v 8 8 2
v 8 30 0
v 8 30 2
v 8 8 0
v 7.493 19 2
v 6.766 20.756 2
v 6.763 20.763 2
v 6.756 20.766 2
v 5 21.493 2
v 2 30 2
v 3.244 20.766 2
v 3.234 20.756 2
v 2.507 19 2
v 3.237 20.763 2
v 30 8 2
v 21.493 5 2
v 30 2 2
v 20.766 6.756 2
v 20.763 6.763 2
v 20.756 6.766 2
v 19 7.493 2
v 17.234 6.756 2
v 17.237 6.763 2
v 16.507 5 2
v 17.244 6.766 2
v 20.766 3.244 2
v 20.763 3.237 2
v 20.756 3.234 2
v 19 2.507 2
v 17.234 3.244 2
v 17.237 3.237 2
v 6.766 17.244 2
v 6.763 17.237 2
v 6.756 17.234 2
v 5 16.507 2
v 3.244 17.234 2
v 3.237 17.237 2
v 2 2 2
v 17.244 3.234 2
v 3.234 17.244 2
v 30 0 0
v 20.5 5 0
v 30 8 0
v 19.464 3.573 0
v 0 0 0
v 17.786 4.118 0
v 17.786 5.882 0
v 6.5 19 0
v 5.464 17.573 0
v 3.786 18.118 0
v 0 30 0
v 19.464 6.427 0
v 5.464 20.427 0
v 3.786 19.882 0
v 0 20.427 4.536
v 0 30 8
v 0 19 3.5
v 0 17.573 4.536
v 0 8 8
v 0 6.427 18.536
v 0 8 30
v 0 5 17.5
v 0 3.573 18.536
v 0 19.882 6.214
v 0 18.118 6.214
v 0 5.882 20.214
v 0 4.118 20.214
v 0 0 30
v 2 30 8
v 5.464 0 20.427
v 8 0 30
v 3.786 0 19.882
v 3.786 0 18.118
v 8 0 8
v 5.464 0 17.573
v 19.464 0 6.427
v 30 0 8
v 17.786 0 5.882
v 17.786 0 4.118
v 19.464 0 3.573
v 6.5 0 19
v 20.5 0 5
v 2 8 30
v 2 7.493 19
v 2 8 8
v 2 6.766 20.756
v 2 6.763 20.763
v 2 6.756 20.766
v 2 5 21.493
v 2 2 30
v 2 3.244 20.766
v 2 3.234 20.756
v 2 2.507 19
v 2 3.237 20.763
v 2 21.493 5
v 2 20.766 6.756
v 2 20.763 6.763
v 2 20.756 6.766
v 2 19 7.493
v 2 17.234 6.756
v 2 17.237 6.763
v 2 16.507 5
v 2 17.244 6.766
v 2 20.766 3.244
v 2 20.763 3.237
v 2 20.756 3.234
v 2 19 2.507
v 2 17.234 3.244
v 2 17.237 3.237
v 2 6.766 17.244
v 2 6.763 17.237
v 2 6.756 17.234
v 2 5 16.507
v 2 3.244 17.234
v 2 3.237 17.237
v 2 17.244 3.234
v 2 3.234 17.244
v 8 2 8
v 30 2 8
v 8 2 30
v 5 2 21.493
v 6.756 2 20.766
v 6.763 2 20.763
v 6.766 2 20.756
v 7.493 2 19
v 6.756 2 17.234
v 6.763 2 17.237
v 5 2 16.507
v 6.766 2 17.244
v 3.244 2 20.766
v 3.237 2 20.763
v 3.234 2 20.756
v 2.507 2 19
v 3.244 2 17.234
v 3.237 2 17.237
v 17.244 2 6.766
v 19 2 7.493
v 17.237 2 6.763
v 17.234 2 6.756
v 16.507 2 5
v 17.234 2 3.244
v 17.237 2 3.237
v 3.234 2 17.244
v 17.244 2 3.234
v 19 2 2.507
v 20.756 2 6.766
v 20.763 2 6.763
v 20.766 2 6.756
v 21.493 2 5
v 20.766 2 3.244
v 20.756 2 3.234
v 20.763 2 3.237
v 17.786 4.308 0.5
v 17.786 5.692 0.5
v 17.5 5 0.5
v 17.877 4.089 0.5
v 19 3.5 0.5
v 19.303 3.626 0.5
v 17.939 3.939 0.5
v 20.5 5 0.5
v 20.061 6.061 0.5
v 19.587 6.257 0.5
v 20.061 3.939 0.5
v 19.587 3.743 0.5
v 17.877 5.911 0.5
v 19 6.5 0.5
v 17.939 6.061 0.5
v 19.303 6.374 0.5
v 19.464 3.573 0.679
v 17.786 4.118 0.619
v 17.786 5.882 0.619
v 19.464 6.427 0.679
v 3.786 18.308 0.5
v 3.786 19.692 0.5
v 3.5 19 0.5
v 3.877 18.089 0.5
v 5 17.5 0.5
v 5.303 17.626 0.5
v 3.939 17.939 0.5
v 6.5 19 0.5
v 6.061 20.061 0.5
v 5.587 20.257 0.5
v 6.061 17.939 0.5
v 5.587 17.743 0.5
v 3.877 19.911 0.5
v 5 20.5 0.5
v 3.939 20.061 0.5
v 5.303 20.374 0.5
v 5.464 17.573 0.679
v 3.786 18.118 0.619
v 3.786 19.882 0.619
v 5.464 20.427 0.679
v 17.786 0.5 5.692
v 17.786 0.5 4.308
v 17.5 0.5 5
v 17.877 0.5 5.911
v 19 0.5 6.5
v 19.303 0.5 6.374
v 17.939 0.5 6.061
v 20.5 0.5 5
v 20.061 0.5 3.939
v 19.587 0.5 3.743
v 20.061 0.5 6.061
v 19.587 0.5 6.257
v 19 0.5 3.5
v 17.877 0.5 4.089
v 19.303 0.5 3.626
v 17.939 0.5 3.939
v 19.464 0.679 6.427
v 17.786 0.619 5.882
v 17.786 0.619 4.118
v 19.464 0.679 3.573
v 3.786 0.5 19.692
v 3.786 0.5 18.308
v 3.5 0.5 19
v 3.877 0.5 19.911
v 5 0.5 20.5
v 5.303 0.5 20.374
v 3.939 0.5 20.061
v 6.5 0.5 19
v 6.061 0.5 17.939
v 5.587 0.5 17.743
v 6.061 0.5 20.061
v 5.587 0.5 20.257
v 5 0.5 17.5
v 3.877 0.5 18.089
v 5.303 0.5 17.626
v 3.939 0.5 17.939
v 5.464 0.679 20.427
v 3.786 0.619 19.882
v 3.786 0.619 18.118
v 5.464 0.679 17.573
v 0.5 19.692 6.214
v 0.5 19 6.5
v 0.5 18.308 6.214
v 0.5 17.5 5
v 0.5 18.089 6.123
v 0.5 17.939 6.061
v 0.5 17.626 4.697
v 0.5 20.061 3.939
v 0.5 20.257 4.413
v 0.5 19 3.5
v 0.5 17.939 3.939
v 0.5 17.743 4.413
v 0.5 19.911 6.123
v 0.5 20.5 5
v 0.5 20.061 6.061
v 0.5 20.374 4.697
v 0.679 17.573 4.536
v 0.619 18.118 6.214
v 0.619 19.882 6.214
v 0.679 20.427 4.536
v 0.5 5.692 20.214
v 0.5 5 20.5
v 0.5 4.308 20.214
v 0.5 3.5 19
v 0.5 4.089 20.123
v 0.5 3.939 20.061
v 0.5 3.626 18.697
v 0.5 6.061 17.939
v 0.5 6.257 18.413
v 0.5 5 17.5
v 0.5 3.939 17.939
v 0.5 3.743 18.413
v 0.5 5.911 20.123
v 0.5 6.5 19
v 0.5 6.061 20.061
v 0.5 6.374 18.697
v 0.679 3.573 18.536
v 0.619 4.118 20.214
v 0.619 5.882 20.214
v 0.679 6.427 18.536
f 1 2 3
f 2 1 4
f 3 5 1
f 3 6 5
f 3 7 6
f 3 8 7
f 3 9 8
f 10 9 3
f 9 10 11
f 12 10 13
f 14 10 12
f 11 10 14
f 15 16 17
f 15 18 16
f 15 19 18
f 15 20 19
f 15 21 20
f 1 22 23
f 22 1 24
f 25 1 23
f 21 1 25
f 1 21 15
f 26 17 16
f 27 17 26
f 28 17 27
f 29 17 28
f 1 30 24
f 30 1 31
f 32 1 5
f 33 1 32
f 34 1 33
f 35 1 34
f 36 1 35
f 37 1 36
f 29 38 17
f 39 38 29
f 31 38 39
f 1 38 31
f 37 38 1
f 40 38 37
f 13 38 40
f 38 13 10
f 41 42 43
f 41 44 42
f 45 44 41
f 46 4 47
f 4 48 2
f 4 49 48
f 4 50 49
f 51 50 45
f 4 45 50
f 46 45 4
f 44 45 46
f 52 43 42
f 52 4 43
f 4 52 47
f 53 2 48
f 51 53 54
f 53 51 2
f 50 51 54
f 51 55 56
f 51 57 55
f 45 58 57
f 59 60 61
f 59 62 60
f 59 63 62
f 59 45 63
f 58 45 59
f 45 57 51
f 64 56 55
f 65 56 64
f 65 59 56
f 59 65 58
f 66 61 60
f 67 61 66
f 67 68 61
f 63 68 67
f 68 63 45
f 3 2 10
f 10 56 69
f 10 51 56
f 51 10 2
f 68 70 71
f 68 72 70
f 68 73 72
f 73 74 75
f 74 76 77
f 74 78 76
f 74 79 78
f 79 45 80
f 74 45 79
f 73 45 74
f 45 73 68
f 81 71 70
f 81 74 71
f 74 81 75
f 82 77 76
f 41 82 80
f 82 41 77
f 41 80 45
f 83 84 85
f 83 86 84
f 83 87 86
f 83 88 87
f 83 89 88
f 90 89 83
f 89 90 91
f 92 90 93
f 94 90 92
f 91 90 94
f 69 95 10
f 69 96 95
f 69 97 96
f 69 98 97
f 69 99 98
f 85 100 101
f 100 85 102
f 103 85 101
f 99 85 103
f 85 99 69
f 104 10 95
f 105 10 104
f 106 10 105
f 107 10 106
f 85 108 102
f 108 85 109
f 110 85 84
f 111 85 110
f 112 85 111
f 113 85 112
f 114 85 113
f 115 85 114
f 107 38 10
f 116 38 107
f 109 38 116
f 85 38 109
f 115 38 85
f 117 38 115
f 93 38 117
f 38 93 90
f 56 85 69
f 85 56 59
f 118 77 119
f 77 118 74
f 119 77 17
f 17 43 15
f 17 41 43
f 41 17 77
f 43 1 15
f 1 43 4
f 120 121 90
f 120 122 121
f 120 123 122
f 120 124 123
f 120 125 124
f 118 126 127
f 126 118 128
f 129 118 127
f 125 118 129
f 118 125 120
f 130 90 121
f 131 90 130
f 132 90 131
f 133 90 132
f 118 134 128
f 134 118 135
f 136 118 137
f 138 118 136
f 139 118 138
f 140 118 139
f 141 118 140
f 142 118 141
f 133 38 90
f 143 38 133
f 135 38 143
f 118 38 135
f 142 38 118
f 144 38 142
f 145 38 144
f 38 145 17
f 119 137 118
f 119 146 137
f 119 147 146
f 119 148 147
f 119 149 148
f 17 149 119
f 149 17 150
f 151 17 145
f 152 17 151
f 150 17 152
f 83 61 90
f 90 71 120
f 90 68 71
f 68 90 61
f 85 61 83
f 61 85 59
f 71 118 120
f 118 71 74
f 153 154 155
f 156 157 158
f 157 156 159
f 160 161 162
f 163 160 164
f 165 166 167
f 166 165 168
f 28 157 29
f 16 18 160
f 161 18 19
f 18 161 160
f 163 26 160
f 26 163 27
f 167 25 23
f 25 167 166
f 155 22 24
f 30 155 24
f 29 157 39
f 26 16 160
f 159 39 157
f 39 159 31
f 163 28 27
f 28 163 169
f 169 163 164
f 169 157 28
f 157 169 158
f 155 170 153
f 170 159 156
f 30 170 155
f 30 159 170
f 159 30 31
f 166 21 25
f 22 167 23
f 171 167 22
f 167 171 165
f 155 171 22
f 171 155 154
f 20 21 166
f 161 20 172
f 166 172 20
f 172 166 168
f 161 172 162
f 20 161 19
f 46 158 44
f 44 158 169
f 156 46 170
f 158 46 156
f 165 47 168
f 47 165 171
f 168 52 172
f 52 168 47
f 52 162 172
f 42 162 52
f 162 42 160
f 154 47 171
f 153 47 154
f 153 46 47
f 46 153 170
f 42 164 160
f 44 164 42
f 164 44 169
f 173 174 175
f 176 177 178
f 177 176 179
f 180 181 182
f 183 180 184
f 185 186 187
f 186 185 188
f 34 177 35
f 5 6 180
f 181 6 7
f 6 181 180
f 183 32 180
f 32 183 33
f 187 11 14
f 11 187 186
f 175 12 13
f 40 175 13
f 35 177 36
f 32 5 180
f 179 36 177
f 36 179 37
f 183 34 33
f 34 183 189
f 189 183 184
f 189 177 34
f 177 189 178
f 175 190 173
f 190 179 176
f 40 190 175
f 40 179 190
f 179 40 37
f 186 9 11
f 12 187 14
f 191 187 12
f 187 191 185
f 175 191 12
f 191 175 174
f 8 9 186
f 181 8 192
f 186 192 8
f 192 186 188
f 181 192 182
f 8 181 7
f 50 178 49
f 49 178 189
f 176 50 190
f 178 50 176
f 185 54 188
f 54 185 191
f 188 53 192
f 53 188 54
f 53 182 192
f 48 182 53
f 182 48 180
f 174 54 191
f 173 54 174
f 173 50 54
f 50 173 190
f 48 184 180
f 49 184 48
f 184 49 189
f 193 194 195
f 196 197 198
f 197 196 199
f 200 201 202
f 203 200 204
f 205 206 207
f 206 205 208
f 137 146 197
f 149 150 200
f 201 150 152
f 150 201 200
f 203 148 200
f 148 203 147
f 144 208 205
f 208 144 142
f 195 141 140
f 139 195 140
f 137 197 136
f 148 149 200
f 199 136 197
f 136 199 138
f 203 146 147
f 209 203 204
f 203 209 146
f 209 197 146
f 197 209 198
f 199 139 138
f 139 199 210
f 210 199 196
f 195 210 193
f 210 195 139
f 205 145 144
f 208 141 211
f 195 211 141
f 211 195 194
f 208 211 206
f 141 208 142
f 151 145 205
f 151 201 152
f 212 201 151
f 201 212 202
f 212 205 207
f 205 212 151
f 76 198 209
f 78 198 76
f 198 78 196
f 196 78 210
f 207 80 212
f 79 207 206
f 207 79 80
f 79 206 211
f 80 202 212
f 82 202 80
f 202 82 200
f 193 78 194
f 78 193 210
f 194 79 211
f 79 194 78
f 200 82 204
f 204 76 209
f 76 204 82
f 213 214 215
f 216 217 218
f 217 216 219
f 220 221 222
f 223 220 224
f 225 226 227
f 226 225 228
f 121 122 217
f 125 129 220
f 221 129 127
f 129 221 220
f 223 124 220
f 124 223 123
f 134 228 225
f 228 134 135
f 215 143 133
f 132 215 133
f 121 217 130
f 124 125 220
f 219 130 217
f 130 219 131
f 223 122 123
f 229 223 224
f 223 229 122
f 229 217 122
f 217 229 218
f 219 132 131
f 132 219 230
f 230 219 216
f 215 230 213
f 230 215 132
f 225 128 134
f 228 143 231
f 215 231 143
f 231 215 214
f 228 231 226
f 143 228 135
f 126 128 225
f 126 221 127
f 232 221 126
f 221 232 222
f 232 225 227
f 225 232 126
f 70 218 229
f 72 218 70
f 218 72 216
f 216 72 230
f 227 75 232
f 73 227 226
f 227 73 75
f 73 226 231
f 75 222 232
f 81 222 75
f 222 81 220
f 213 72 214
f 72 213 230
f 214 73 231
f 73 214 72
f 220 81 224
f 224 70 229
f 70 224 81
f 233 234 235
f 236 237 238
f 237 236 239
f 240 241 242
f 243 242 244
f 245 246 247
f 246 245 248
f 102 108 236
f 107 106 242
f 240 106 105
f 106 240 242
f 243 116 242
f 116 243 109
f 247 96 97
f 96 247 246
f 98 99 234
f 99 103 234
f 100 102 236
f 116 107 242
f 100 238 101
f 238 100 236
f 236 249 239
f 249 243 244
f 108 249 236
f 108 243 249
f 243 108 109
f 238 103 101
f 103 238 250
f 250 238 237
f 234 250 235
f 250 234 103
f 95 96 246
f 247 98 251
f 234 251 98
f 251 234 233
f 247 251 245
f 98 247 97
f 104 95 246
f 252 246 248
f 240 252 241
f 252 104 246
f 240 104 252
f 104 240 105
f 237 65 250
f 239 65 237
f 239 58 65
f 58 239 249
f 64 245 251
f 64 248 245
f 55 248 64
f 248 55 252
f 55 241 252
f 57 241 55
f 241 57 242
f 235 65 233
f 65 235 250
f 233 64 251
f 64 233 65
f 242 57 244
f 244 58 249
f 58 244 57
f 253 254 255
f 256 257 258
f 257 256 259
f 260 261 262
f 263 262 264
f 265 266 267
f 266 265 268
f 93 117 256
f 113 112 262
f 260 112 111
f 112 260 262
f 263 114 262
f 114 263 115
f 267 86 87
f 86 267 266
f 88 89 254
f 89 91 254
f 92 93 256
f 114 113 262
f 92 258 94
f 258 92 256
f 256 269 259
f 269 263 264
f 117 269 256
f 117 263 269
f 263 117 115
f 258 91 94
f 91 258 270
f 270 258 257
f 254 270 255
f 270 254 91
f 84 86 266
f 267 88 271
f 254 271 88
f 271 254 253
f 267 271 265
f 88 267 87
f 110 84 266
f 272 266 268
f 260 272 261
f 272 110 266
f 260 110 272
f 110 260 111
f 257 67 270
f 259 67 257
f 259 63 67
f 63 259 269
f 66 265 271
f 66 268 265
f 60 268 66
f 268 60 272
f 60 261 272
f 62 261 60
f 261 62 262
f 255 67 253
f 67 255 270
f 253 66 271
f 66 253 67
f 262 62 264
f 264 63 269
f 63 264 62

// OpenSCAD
width = 8;
length = 30;
depth = 2;

hole_radius = 1.5;
screw_depth = 1.5;
screw_radius = 2.5;

difference() {
    union() {
        cube([width,length,depth]);
        cube([depth,length,width]);

        cube([length,width,depth]);
        cube([length,depth,width]);

        cube([depth,width,length]);
        cube([width,depth,length]);
    }
    hole_x = (length-width)/2+width;
    hole_y = (width-depth)/2+depth;
    translate([hole_x,hole_y,0]){ 
        translate([0,0,depth-screw_depth]) cylinder(screw_depth+0.01,hole_radius,screw_radius);
        cylinder(1000,hole_radius,hole_radius,center=true);
        }
    translate([hole_y,hole_x,0]){ 
        translate([0,0,depth-screw_depth]) cylinder(screw_depth+0.01,hole_radius,screw_radius);
        cylinder(1000,hole_radius,hole_radius,center=true);
        }
    translate([hole_x,0,hole_y]) rotate([-90,0,0]) { 
        translate([0,0,depth-screw_depth]) cylinder(screw_depth+0.01,hole_radius,screw_radius);
        cylinder(1000,hole_radius,hole_radius,center=true);
        }
    translate([hole_y,0,hole_x]) rotate([-90,0,0]) { 
        translate([0,0,depth-screw_depth]) cylinder(screw_depth+0.01,hole_radius,screw_radius);
        cylinder(1000,hole_radius,hole_radius,center=true);
        }
    translate([0,hole_x,hole_y]) rotate([0,90,0]) { 
        translate([0,0,depth-screw_depth]) cylinder(screw_depth+0.01,hole_radius,screw_radius);
        cylinder(1000,hole_radius,hole_radius,center=true);
        }
    translate([0,hole_y,hole_x]) rotate([0,90,0]){ 
        translate([0,0,depth-screw_depth]) cylinder(screw_depth+0.01,hole_radius,screw_radius);
        cylinder(1000,hole_radius,hole_radius,center=true);
        }
}
